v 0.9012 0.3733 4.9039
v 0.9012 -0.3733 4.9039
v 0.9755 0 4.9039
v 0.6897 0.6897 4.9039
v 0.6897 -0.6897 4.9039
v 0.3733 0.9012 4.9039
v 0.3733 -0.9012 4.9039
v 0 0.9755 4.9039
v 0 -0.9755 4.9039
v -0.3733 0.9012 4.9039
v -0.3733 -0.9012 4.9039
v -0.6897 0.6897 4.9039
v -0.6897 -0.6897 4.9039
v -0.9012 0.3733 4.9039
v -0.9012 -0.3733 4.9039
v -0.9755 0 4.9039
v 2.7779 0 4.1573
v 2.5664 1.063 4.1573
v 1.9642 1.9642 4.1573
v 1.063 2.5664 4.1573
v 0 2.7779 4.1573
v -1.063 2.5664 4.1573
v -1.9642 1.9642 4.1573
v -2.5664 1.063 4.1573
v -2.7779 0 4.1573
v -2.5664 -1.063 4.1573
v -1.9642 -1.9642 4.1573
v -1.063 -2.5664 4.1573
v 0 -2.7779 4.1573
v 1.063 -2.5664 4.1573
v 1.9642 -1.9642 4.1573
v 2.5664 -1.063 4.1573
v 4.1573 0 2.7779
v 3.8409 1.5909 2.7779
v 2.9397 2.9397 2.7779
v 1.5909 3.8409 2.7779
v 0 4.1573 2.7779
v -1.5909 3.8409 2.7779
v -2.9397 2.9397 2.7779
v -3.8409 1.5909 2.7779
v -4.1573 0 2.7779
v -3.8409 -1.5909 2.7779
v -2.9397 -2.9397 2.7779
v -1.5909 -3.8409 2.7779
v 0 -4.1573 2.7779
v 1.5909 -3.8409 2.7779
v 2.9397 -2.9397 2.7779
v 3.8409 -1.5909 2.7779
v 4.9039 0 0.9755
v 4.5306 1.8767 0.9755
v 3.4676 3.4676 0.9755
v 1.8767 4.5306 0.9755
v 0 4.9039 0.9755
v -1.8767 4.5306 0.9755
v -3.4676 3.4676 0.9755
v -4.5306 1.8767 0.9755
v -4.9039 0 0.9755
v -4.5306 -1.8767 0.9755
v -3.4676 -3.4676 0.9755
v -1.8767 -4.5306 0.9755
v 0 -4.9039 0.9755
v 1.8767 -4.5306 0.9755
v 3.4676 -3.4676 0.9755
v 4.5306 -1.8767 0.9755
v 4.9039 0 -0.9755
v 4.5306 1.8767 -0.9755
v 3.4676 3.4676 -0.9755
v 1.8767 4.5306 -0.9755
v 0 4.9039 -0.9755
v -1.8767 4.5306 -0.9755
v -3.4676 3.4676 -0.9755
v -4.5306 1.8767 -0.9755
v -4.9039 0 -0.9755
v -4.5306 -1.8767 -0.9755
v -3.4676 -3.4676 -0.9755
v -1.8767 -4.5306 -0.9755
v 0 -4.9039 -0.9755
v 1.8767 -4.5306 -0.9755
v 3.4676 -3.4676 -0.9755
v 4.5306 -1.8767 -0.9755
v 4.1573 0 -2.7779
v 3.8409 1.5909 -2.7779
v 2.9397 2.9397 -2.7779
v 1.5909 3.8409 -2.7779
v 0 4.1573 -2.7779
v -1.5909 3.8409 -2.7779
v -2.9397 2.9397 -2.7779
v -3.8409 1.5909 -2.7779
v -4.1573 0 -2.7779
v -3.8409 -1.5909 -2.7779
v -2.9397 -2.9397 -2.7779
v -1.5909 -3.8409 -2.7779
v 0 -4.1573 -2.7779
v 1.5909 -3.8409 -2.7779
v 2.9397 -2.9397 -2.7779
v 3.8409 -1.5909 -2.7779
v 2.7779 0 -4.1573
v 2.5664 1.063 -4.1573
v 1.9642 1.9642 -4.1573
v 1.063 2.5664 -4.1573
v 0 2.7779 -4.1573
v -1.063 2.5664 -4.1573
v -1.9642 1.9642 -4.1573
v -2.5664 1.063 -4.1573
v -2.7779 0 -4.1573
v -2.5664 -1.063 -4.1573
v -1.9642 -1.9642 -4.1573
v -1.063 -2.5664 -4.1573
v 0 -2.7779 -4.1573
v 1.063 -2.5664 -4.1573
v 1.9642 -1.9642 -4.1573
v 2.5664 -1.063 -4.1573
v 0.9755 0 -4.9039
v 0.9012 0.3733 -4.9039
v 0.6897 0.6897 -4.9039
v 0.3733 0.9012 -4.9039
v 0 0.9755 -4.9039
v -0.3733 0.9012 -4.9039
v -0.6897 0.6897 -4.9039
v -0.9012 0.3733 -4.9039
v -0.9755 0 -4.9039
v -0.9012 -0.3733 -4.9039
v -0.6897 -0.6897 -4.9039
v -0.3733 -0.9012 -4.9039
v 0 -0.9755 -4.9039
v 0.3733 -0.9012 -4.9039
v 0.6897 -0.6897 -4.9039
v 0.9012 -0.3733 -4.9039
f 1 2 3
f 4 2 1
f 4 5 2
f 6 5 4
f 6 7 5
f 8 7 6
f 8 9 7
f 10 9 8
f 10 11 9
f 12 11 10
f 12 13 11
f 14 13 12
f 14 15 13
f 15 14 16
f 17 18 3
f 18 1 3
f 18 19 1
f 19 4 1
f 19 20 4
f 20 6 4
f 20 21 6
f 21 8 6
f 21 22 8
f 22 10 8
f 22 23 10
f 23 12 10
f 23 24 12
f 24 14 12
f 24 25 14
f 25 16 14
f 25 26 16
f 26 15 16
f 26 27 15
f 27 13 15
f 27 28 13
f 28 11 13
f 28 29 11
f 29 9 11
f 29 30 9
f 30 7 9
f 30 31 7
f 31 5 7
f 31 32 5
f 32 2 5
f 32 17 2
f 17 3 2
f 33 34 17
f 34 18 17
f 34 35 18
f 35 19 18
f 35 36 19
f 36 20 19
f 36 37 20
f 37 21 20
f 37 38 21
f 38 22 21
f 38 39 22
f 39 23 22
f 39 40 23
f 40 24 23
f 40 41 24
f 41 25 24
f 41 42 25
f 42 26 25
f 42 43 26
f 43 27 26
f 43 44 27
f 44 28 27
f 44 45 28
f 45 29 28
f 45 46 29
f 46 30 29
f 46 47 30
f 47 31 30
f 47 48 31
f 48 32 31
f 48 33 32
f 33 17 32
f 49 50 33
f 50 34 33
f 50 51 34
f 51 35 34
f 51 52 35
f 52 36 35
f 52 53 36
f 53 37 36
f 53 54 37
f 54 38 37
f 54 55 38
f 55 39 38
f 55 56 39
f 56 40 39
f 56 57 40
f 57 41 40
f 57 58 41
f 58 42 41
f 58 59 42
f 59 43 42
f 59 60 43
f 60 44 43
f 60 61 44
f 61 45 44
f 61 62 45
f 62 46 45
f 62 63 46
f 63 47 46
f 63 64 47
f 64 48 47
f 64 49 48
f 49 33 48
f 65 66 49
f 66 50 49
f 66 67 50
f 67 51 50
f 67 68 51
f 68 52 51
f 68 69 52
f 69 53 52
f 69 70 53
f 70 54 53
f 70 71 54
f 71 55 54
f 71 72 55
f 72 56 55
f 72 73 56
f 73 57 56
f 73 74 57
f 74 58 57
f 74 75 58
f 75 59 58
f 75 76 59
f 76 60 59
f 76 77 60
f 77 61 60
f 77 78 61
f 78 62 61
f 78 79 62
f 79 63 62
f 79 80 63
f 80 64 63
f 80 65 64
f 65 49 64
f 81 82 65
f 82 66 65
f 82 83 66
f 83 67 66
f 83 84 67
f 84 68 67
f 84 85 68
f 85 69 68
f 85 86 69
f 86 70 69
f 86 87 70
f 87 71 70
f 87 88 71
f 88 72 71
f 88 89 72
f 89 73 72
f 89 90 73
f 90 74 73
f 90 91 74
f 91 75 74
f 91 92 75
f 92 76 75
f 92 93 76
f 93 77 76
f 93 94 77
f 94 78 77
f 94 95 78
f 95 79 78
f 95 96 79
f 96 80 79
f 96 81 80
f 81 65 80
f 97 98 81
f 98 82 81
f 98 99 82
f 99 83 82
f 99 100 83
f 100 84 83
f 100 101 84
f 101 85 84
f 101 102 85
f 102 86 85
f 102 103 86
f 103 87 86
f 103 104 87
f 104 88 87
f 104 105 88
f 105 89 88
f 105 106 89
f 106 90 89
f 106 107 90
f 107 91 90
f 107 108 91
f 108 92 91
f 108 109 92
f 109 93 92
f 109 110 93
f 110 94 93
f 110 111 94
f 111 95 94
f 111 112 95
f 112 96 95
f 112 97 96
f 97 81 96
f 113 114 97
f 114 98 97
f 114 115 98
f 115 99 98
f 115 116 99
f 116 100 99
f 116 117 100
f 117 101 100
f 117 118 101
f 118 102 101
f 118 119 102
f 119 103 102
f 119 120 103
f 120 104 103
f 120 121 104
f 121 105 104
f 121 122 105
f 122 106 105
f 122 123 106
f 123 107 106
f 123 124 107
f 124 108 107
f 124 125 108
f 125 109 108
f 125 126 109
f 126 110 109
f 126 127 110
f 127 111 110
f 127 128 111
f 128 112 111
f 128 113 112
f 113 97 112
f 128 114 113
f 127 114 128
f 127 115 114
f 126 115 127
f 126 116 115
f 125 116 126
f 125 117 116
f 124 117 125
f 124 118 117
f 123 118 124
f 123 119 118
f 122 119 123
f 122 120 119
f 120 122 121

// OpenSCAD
// Generated by scadwright. Do not hand-edit —
// edit the Python source and regenerate.

sphere(r=5);
